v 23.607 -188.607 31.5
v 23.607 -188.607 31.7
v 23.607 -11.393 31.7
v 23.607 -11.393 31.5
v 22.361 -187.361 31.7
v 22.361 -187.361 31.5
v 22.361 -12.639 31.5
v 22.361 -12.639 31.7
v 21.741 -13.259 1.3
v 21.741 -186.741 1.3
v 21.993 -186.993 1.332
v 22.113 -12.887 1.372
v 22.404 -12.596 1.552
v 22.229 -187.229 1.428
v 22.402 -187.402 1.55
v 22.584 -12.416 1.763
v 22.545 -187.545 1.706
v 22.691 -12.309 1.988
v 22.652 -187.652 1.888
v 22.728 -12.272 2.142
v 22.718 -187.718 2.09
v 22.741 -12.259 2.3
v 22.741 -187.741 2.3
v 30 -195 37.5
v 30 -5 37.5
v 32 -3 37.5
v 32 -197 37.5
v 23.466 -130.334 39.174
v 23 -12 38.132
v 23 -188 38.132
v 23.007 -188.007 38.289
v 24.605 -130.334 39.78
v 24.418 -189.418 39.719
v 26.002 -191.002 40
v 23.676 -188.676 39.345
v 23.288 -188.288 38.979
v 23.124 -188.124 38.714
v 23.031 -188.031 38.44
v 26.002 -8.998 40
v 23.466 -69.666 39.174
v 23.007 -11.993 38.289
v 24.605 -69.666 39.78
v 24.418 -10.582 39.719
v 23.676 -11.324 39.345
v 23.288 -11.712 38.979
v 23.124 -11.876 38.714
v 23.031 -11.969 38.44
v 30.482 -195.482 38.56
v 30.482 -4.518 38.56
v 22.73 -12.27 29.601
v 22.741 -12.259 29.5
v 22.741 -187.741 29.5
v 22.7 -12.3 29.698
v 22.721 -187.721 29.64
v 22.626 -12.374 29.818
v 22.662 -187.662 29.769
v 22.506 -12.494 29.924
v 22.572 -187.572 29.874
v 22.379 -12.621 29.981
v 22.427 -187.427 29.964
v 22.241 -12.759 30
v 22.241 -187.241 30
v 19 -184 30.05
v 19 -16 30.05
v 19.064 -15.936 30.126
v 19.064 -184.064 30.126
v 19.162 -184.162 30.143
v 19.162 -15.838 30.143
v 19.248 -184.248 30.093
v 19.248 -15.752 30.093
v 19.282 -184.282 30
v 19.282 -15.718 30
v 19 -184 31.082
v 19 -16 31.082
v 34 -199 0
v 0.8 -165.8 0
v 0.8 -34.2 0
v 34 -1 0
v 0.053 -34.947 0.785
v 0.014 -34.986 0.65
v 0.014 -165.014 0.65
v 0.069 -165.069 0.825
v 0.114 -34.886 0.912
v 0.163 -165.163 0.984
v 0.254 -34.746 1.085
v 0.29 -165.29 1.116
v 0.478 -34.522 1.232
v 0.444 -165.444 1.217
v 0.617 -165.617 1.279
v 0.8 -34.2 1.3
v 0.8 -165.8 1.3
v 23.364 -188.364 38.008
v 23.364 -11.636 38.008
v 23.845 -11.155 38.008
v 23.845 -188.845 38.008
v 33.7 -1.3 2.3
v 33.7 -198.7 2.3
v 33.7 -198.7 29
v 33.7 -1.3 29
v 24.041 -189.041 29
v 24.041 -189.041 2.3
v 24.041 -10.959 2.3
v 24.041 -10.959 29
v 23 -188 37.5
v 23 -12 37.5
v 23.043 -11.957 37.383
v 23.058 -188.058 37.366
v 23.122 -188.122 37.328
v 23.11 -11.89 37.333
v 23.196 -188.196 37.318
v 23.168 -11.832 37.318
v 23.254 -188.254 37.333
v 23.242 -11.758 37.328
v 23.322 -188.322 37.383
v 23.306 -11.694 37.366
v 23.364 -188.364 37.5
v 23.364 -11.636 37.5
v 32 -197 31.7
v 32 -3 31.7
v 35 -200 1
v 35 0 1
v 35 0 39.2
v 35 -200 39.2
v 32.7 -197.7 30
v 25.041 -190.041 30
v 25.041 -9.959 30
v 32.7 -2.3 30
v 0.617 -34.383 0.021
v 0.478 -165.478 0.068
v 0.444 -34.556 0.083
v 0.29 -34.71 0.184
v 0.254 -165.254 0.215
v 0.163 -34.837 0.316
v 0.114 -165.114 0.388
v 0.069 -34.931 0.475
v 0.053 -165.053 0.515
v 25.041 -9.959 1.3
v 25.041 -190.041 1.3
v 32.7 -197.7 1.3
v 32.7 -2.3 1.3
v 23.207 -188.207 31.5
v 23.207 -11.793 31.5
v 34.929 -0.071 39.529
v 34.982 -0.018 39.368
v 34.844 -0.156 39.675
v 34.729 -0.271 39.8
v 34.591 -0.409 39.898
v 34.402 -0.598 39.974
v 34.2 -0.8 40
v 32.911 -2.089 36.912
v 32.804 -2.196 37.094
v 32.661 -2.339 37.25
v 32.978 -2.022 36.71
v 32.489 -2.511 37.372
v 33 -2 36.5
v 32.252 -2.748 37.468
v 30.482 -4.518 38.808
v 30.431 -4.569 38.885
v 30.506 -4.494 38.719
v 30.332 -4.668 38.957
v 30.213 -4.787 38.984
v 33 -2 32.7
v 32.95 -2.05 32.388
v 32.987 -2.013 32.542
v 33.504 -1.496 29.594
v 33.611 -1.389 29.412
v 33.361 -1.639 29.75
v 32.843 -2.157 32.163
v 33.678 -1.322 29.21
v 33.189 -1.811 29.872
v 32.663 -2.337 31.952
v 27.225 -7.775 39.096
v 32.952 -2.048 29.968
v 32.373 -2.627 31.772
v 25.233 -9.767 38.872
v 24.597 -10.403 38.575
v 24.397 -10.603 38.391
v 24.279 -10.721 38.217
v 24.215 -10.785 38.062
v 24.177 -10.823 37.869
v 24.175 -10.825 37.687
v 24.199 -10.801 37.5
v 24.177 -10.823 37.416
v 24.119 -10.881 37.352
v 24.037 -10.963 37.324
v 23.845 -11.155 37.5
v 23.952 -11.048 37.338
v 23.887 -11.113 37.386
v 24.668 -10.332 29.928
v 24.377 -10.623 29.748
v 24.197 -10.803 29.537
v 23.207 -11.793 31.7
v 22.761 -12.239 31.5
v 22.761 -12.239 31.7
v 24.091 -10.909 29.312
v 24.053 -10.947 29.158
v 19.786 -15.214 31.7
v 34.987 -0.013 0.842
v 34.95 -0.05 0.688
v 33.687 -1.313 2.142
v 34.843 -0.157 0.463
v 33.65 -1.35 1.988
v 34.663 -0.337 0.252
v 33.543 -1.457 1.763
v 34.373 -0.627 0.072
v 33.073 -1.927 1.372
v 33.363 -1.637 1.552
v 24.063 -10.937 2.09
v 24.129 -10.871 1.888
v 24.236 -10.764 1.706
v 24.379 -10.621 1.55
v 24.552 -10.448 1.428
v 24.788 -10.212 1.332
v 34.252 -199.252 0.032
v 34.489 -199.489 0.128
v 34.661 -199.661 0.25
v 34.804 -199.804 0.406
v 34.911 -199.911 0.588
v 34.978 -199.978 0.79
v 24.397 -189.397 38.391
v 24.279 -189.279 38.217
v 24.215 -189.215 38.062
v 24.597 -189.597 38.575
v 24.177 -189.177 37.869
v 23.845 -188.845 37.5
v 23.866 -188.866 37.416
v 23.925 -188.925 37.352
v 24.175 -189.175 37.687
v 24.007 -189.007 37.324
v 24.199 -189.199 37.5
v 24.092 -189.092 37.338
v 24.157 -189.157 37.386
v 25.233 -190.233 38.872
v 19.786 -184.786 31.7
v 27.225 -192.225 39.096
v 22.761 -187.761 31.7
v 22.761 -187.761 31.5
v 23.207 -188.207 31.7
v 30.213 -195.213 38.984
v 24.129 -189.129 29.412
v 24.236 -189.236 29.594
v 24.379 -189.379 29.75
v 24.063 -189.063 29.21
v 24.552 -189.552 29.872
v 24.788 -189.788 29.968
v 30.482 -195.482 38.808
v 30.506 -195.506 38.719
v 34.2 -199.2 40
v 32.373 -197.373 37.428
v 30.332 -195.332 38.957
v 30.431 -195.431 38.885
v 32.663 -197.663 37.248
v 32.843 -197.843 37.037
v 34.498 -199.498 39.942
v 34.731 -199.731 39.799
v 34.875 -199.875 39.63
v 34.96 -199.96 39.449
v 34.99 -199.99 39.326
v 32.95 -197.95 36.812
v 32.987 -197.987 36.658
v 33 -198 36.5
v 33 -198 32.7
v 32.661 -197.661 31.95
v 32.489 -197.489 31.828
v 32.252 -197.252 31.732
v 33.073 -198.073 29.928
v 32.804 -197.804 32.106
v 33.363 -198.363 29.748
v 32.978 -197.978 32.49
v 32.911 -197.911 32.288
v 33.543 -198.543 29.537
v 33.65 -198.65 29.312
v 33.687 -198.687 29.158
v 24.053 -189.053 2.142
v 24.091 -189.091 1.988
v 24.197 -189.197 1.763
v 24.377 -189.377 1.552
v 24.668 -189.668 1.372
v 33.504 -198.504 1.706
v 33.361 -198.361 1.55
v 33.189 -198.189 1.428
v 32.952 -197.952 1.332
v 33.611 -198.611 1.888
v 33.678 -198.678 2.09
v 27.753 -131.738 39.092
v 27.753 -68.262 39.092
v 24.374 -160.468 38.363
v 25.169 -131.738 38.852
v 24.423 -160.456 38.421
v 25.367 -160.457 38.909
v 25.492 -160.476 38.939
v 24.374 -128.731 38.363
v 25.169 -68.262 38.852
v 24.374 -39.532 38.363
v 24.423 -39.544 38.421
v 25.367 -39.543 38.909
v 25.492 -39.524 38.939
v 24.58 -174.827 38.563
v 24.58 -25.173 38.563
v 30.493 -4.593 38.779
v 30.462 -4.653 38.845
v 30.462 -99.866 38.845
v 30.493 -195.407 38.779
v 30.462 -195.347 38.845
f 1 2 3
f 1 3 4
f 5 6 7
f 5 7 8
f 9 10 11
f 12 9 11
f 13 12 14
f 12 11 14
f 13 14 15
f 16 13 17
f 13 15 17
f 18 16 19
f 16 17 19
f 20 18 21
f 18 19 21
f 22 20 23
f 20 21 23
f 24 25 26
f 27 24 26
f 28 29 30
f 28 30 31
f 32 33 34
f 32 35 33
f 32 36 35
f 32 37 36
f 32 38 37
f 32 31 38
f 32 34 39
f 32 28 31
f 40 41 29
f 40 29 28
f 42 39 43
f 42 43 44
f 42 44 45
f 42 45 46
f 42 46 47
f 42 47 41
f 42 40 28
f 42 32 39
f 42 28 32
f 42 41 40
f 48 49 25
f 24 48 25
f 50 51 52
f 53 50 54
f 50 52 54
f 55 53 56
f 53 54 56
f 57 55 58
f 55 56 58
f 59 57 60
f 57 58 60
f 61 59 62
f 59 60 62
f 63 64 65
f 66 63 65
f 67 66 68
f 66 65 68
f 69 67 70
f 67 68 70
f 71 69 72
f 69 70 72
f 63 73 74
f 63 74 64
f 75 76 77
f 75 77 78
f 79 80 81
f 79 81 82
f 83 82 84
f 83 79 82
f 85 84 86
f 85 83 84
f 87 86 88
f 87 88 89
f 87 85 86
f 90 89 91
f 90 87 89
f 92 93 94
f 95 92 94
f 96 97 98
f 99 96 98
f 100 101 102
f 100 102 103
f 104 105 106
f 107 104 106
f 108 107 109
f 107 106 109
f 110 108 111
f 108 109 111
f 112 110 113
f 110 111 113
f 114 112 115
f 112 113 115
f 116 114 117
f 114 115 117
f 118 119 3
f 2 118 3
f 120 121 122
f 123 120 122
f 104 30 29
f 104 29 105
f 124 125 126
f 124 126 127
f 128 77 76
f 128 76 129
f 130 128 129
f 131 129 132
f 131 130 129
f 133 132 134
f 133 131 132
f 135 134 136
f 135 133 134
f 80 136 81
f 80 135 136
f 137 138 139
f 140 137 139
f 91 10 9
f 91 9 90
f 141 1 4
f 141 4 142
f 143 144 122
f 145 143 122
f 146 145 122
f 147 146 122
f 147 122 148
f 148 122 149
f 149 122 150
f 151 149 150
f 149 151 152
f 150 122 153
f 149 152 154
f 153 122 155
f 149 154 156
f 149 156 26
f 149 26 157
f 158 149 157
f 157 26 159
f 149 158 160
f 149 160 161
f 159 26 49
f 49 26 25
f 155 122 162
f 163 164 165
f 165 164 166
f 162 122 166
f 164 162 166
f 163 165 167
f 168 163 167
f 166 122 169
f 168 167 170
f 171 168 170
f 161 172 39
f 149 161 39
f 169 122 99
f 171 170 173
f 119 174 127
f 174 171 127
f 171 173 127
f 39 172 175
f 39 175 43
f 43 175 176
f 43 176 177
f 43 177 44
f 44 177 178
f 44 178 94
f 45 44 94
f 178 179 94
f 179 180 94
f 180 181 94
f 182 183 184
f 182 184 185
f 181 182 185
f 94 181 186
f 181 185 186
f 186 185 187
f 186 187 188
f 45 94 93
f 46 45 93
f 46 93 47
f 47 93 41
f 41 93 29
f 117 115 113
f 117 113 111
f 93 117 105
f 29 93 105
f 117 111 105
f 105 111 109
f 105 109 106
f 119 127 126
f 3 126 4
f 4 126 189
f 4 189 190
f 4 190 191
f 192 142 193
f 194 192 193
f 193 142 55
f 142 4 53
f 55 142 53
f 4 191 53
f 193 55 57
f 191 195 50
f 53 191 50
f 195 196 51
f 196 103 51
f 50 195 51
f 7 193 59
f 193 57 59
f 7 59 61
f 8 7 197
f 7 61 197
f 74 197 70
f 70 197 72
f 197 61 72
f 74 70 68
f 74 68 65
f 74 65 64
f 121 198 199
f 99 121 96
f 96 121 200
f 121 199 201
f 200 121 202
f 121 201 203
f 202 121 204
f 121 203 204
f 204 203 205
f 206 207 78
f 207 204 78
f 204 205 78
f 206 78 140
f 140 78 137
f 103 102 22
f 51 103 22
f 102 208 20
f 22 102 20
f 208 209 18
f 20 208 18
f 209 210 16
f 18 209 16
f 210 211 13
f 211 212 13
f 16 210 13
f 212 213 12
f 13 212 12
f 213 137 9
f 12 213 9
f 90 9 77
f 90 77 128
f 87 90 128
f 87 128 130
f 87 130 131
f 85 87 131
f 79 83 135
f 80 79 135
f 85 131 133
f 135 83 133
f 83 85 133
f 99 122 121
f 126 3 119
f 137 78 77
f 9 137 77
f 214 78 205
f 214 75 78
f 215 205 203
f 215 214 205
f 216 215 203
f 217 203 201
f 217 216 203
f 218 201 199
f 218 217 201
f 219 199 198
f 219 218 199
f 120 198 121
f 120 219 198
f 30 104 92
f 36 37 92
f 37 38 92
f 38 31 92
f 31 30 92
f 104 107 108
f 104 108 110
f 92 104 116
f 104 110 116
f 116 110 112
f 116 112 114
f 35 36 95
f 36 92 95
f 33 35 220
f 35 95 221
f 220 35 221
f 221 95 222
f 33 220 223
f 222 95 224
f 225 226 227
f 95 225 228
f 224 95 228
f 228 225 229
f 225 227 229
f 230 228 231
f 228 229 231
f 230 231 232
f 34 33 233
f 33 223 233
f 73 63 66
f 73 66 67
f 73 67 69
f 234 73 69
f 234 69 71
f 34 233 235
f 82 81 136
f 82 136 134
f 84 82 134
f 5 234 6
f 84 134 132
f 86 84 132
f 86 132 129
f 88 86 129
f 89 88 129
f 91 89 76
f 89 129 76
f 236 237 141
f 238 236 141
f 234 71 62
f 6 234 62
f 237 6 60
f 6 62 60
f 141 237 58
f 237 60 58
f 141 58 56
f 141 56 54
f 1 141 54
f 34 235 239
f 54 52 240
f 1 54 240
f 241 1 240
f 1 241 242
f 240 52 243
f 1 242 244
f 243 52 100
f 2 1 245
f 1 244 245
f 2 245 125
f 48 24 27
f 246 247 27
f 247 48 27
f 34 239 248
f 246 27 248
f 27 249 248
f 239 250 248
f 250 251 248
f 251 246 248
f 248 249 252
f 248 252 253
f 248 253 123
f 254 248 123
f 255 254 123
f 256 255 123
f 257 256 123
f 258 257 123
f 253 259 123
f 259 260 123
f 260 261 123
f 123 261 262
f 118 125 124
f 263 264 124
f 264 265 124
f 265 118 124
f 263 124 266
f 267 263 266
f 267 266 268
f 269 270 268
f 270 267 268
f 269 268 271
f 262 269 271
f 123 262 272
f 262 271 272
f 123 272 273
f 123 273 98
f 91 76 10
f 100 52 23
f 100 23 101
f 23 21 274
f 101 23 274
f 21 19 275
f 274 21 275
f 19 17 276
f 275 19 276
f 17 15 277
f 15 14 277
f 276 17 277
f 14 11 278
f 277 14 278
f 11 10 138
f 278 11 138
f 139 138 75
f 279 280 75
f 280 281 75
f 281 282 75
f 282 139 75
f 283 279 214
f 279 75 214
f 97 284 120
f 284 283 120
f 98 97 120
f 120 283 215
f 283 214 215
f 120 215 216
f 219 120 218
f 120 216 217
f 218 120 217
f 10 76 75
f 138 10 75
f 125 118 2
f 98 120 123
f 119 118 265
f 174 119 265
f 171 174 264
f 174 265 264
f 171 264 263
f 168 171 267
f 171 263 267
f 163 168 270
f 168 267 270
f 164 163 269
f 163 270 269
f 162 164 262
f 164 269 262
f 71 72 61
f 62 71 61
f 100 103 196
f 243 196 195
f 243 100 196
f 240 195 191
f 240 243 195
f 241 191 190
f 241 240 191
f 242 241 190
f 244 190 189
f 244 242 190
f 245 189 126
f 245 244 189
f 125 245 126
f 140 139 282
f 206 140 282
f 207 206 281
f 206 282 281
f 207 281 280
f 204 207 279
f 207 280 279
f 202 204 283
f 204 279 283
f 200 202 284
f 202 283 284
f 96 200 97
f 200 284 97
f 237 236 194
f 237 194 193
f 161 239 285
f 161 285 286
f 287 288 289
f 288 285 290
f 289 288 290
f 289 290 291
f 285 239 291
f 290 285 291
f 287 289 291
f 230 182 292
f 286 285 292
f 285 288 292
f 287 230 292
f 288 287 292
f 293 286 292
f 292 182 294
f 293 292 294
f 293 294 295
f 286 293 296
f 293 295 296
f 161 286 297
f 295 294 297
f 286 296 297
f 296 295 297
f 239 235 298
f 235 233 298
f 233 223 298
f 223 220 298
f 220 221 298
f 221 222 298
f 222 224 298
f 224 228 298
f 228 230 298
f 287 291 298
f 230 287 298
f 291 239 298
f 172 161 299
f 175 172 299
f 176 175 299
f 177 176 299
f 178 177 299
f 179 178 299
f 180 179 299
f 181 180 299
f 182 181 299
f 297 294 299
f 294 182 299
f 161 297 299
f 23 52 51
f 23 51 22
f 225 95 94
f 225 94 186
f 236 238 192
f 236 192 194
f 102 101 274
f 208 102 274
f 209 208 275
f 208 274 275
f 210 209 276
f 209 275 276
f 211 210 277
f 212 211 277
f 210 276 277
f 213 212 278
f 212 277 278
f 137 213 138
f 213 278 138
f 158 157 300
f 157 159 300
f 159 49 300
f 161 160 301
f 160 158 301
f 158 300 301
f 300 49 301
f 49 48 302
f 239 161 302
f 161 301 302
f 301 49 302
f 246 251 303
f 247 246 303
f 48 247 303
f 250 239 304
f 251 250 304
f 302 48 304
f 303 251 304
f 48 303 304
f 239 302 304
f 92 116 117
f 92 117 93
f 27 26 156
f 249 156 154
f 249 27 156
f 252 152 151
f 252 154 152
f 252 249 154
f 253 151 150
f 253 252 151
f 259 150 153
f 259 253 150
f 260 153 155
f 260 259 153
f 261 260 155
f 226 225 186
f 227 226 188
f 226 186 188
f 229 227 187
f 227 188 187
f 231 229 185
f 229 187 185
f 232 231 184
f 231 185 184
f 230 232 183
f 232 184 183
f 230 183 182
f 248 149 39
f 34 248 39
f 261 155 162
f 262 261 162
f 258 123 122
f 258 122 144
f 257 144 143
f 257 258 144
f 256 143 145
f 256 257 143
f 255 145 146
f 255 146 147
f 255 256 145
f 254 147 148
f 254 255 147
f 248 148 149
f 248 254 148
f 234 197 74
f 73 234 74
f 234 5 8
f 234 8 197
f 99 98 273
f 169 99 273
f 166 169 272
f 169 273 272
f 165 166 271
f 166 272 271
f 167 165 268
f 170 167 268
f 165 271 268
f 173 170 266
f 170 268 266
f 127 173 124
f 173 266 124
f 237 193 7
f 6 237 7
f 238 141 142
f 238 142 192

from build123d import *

# Parameters (mm, degrees)
F0_W        = 9.6591939426
F0_H        = 28.7
F1_DEPTH    = 200
F3_R        = 1
F4_R        = 1
F5_R        = 1
F6_R        = 0.3
F7_T1_DEPTH = 204
F8_R        = 1
F9_R        = 0.8
F10_R       = 0.5
F11_DEPTH   = 40.0010001


# Not quite as in the source:
# - a fillet or chamfer that OpenCascade refuses, or shapes differently, is made with other operations: its cross-section is extruded or revolved along the edge and cut away or added


with BuildPart() as f1:
    # F0 (on Front) → F1 (new body)
    with BuildSketch(Plane.XZ):
        with BuildLine():
            add(Edge.make_bspline(
                [(23, 38.132454922), (22.9909009473, 39.4079380262), (24.6147458735, 39.9568075433), (26.0023356814, 40)],
                knots=[0, 0, 0, 0, 3.5347881, 3.5347881, 3.5347881, 3.5347881], degree=3))
            Line((23, 38.132454922), (23, 37.5))
            Line((23, 37.5), (23.3642607927, 37.5))
            Line((23.3642607927, 37.5), (23.3642607927, 38.0080822861))
            Line((23.3642607927, 38.0080822861), (23.8452493811, 38.0080822861))
            Line((23.8452493811, 38.0080822861), (23.8452493811, 37.5))
            Line((23.8452493811, 37.5), (24.1986030313, 37.5))
            add(Edge.make_bspline(
                [(24.1986030313, 37.5), (23.7402990776, 39.8885678506), (29.4077517188, 38.843408227), (30.681502074, 39)],
                knots=[0, 0, 0, 0, 6.6541701209, 6.6541701209, 6.6541701209, 6.6541701209], degree=3))
            Line((30.681502074, 39), (30, 37.5))
            Line((30, 37.5), (33, 37.5))
            Line((33, 37.5), (33, 31.7))
            Line((33, 31.7), (23.6065152377, 31.7))
            Line((23.6065152377, 31.7), (23.6065152377, 31.5))
            Line((23.6065152377, 31.5), (23.2065152377, 31.5))
            Line((23.2065152377, 31.5), (23.2065152377, 31.7))
            Line((23.2065152377, 31.7), (22.7607861161, 31.7))
            Line((22.7607861161, 31.7), (22.7607861161, 31.5))
            Line((22.7607861161, 31.5), (22.3607861161, 31.5))
            Line((22.3607861161, 31.5), (22.3607861161, 31.7))
            Line((22.3607861161, 31.7), (19.7864715389, 31.7))
            Line((19.7864715389, 31.7), (19, 31.0823734798))
            Line((19, 31.0823734798), (19, 30.0495919195))
            ThreePointArc((19, 30.0495919195), (19.1617787134, 30.1431279745), (19.2819274904, 30))
            Line((19.2819274904, 30), (22.7408060574, 30))
            Line((22.7408060574, 30), (22.7408060574, 1.3))
            Line((22.7408060574, 1.3), (0, 1.3))
            Line((0, 1.3), (0, 0))
            Line((0, 0), (35, 0))
            Line((35, 0), (35, 40))
            Line((35, 40), (26.3559219739, 40))
            Line((26.3559219739, 40), (26.0023356814, 40))
        make_face()
        with Locations((28.8704030287, 15.65)):
            Rectangle(F0_W, F0_H, mode=Mode.SUBTRACT)
        with BuildLine():
            Line((23.3642607927, 37.5), (23, 37.5))
            ThreePointArc((23, 37.5), (23.1821303964, 37.3178696036), (23.3642607927, 37.5))
        make_face()
        with BuildLine():
            Line((24.1986030313, 37.5), (23.8452493811, 37.5))
            ThreePointArc((23.8452493811, 37.5), (24.0219262062, 37.3233231749), (24.1986030313, 37.5))
        make_face()
    extrude(amount=F1_DEPTH)

    # F3
    f3_edges = [f1.edges().sort_by_distance(p)[0] for p in [
        (33.7, -100, 30),
        (33.7, -100, 1.3),
        (24.040806, -100, 1.3),
        (24.040806, -100, 30),
    ]]
    fillet(f3_edges, radius=F3_R)

    # F4
    f4_edges = [f1.edges().sort_by_distance(p)[0] for p in [
        (22.740806, -100, 1.3),
    ]]
    fillet(f4_edges, radius=F4_R)

    # F5
    f5_edges = [f1.edges().sort_by_distance(p)[0] for p in [
        (33, -100, 31.7),
        (33, -100, 37.5),
    ]]
    fillet(f5_edges, radius=F5_R)

    # F6
    f6_edges = [f1.edges().sort_by_distance(p)[0] for p in [
        (30.681502, -100, 39),
    ]]
    fillet(f6_edges, radius=F6_R)

    # F7: fillet of radius 0.8 on 2 edges, made by hand

    # F7_s2 → F7_t1 (cut)
    with BuildSketch(Plane.XZ.offset(-2)):
        with BuildLine():
            ThreePointArc((0, 0.5), (0.2343145751, 1.0656854249), (0.8, 1.3))
            Line((0.8, 1.3), (0, 1.3))
            Line((0, 1.3), (0, 0.5))
        make_face()
        with BuildLine():
            ThreePointArc((0.8, 0), (0.2343145751, 0.2343145751), (0, 0.8))
            Line((0, 0.8), (0, 0))
            Line((0, 0), (0.8, 0))
        make_face()
    extrude(amount=F7_T1_DEPTH, mode=Mode.SUBTRACT)

    # F8
    f8_edges = [f1.edges().sort_by_distance(p)[0] for p in [
        (35, -100, 0),
    ]]
    fillet(f8_edges, radius=F8_R)

    # F9
    f9_edges = [f1.edges().sort_by_distance(p)[0] for p in [
        (35, -100, 40),
    ]]
    fillet(f9_edges, radius=F9_R)

    # F10
    f10_edges = [f1.edges().sort_by_distance(p)[0] for p in [
        (22.740806, -100, 30),
    ]]
    fillet(f10_edges, radius=F10_R)

    # F2 (on face) → F11 (cut, through all)
    with BuildSketch(Plane(origin=(0, 0, 0), x_dir=(1, 0, 0), z_dir=(0, 0, -1))):
        Polygon((0, 165), (35, 200), (0, 200), align=None)
        Polygon((0, 0), (35, 0), (0, 35), align=None)
    extrude(amount=-F11_DEPTH, mode=Mode.SUBTRACT)


solid = f1.part
